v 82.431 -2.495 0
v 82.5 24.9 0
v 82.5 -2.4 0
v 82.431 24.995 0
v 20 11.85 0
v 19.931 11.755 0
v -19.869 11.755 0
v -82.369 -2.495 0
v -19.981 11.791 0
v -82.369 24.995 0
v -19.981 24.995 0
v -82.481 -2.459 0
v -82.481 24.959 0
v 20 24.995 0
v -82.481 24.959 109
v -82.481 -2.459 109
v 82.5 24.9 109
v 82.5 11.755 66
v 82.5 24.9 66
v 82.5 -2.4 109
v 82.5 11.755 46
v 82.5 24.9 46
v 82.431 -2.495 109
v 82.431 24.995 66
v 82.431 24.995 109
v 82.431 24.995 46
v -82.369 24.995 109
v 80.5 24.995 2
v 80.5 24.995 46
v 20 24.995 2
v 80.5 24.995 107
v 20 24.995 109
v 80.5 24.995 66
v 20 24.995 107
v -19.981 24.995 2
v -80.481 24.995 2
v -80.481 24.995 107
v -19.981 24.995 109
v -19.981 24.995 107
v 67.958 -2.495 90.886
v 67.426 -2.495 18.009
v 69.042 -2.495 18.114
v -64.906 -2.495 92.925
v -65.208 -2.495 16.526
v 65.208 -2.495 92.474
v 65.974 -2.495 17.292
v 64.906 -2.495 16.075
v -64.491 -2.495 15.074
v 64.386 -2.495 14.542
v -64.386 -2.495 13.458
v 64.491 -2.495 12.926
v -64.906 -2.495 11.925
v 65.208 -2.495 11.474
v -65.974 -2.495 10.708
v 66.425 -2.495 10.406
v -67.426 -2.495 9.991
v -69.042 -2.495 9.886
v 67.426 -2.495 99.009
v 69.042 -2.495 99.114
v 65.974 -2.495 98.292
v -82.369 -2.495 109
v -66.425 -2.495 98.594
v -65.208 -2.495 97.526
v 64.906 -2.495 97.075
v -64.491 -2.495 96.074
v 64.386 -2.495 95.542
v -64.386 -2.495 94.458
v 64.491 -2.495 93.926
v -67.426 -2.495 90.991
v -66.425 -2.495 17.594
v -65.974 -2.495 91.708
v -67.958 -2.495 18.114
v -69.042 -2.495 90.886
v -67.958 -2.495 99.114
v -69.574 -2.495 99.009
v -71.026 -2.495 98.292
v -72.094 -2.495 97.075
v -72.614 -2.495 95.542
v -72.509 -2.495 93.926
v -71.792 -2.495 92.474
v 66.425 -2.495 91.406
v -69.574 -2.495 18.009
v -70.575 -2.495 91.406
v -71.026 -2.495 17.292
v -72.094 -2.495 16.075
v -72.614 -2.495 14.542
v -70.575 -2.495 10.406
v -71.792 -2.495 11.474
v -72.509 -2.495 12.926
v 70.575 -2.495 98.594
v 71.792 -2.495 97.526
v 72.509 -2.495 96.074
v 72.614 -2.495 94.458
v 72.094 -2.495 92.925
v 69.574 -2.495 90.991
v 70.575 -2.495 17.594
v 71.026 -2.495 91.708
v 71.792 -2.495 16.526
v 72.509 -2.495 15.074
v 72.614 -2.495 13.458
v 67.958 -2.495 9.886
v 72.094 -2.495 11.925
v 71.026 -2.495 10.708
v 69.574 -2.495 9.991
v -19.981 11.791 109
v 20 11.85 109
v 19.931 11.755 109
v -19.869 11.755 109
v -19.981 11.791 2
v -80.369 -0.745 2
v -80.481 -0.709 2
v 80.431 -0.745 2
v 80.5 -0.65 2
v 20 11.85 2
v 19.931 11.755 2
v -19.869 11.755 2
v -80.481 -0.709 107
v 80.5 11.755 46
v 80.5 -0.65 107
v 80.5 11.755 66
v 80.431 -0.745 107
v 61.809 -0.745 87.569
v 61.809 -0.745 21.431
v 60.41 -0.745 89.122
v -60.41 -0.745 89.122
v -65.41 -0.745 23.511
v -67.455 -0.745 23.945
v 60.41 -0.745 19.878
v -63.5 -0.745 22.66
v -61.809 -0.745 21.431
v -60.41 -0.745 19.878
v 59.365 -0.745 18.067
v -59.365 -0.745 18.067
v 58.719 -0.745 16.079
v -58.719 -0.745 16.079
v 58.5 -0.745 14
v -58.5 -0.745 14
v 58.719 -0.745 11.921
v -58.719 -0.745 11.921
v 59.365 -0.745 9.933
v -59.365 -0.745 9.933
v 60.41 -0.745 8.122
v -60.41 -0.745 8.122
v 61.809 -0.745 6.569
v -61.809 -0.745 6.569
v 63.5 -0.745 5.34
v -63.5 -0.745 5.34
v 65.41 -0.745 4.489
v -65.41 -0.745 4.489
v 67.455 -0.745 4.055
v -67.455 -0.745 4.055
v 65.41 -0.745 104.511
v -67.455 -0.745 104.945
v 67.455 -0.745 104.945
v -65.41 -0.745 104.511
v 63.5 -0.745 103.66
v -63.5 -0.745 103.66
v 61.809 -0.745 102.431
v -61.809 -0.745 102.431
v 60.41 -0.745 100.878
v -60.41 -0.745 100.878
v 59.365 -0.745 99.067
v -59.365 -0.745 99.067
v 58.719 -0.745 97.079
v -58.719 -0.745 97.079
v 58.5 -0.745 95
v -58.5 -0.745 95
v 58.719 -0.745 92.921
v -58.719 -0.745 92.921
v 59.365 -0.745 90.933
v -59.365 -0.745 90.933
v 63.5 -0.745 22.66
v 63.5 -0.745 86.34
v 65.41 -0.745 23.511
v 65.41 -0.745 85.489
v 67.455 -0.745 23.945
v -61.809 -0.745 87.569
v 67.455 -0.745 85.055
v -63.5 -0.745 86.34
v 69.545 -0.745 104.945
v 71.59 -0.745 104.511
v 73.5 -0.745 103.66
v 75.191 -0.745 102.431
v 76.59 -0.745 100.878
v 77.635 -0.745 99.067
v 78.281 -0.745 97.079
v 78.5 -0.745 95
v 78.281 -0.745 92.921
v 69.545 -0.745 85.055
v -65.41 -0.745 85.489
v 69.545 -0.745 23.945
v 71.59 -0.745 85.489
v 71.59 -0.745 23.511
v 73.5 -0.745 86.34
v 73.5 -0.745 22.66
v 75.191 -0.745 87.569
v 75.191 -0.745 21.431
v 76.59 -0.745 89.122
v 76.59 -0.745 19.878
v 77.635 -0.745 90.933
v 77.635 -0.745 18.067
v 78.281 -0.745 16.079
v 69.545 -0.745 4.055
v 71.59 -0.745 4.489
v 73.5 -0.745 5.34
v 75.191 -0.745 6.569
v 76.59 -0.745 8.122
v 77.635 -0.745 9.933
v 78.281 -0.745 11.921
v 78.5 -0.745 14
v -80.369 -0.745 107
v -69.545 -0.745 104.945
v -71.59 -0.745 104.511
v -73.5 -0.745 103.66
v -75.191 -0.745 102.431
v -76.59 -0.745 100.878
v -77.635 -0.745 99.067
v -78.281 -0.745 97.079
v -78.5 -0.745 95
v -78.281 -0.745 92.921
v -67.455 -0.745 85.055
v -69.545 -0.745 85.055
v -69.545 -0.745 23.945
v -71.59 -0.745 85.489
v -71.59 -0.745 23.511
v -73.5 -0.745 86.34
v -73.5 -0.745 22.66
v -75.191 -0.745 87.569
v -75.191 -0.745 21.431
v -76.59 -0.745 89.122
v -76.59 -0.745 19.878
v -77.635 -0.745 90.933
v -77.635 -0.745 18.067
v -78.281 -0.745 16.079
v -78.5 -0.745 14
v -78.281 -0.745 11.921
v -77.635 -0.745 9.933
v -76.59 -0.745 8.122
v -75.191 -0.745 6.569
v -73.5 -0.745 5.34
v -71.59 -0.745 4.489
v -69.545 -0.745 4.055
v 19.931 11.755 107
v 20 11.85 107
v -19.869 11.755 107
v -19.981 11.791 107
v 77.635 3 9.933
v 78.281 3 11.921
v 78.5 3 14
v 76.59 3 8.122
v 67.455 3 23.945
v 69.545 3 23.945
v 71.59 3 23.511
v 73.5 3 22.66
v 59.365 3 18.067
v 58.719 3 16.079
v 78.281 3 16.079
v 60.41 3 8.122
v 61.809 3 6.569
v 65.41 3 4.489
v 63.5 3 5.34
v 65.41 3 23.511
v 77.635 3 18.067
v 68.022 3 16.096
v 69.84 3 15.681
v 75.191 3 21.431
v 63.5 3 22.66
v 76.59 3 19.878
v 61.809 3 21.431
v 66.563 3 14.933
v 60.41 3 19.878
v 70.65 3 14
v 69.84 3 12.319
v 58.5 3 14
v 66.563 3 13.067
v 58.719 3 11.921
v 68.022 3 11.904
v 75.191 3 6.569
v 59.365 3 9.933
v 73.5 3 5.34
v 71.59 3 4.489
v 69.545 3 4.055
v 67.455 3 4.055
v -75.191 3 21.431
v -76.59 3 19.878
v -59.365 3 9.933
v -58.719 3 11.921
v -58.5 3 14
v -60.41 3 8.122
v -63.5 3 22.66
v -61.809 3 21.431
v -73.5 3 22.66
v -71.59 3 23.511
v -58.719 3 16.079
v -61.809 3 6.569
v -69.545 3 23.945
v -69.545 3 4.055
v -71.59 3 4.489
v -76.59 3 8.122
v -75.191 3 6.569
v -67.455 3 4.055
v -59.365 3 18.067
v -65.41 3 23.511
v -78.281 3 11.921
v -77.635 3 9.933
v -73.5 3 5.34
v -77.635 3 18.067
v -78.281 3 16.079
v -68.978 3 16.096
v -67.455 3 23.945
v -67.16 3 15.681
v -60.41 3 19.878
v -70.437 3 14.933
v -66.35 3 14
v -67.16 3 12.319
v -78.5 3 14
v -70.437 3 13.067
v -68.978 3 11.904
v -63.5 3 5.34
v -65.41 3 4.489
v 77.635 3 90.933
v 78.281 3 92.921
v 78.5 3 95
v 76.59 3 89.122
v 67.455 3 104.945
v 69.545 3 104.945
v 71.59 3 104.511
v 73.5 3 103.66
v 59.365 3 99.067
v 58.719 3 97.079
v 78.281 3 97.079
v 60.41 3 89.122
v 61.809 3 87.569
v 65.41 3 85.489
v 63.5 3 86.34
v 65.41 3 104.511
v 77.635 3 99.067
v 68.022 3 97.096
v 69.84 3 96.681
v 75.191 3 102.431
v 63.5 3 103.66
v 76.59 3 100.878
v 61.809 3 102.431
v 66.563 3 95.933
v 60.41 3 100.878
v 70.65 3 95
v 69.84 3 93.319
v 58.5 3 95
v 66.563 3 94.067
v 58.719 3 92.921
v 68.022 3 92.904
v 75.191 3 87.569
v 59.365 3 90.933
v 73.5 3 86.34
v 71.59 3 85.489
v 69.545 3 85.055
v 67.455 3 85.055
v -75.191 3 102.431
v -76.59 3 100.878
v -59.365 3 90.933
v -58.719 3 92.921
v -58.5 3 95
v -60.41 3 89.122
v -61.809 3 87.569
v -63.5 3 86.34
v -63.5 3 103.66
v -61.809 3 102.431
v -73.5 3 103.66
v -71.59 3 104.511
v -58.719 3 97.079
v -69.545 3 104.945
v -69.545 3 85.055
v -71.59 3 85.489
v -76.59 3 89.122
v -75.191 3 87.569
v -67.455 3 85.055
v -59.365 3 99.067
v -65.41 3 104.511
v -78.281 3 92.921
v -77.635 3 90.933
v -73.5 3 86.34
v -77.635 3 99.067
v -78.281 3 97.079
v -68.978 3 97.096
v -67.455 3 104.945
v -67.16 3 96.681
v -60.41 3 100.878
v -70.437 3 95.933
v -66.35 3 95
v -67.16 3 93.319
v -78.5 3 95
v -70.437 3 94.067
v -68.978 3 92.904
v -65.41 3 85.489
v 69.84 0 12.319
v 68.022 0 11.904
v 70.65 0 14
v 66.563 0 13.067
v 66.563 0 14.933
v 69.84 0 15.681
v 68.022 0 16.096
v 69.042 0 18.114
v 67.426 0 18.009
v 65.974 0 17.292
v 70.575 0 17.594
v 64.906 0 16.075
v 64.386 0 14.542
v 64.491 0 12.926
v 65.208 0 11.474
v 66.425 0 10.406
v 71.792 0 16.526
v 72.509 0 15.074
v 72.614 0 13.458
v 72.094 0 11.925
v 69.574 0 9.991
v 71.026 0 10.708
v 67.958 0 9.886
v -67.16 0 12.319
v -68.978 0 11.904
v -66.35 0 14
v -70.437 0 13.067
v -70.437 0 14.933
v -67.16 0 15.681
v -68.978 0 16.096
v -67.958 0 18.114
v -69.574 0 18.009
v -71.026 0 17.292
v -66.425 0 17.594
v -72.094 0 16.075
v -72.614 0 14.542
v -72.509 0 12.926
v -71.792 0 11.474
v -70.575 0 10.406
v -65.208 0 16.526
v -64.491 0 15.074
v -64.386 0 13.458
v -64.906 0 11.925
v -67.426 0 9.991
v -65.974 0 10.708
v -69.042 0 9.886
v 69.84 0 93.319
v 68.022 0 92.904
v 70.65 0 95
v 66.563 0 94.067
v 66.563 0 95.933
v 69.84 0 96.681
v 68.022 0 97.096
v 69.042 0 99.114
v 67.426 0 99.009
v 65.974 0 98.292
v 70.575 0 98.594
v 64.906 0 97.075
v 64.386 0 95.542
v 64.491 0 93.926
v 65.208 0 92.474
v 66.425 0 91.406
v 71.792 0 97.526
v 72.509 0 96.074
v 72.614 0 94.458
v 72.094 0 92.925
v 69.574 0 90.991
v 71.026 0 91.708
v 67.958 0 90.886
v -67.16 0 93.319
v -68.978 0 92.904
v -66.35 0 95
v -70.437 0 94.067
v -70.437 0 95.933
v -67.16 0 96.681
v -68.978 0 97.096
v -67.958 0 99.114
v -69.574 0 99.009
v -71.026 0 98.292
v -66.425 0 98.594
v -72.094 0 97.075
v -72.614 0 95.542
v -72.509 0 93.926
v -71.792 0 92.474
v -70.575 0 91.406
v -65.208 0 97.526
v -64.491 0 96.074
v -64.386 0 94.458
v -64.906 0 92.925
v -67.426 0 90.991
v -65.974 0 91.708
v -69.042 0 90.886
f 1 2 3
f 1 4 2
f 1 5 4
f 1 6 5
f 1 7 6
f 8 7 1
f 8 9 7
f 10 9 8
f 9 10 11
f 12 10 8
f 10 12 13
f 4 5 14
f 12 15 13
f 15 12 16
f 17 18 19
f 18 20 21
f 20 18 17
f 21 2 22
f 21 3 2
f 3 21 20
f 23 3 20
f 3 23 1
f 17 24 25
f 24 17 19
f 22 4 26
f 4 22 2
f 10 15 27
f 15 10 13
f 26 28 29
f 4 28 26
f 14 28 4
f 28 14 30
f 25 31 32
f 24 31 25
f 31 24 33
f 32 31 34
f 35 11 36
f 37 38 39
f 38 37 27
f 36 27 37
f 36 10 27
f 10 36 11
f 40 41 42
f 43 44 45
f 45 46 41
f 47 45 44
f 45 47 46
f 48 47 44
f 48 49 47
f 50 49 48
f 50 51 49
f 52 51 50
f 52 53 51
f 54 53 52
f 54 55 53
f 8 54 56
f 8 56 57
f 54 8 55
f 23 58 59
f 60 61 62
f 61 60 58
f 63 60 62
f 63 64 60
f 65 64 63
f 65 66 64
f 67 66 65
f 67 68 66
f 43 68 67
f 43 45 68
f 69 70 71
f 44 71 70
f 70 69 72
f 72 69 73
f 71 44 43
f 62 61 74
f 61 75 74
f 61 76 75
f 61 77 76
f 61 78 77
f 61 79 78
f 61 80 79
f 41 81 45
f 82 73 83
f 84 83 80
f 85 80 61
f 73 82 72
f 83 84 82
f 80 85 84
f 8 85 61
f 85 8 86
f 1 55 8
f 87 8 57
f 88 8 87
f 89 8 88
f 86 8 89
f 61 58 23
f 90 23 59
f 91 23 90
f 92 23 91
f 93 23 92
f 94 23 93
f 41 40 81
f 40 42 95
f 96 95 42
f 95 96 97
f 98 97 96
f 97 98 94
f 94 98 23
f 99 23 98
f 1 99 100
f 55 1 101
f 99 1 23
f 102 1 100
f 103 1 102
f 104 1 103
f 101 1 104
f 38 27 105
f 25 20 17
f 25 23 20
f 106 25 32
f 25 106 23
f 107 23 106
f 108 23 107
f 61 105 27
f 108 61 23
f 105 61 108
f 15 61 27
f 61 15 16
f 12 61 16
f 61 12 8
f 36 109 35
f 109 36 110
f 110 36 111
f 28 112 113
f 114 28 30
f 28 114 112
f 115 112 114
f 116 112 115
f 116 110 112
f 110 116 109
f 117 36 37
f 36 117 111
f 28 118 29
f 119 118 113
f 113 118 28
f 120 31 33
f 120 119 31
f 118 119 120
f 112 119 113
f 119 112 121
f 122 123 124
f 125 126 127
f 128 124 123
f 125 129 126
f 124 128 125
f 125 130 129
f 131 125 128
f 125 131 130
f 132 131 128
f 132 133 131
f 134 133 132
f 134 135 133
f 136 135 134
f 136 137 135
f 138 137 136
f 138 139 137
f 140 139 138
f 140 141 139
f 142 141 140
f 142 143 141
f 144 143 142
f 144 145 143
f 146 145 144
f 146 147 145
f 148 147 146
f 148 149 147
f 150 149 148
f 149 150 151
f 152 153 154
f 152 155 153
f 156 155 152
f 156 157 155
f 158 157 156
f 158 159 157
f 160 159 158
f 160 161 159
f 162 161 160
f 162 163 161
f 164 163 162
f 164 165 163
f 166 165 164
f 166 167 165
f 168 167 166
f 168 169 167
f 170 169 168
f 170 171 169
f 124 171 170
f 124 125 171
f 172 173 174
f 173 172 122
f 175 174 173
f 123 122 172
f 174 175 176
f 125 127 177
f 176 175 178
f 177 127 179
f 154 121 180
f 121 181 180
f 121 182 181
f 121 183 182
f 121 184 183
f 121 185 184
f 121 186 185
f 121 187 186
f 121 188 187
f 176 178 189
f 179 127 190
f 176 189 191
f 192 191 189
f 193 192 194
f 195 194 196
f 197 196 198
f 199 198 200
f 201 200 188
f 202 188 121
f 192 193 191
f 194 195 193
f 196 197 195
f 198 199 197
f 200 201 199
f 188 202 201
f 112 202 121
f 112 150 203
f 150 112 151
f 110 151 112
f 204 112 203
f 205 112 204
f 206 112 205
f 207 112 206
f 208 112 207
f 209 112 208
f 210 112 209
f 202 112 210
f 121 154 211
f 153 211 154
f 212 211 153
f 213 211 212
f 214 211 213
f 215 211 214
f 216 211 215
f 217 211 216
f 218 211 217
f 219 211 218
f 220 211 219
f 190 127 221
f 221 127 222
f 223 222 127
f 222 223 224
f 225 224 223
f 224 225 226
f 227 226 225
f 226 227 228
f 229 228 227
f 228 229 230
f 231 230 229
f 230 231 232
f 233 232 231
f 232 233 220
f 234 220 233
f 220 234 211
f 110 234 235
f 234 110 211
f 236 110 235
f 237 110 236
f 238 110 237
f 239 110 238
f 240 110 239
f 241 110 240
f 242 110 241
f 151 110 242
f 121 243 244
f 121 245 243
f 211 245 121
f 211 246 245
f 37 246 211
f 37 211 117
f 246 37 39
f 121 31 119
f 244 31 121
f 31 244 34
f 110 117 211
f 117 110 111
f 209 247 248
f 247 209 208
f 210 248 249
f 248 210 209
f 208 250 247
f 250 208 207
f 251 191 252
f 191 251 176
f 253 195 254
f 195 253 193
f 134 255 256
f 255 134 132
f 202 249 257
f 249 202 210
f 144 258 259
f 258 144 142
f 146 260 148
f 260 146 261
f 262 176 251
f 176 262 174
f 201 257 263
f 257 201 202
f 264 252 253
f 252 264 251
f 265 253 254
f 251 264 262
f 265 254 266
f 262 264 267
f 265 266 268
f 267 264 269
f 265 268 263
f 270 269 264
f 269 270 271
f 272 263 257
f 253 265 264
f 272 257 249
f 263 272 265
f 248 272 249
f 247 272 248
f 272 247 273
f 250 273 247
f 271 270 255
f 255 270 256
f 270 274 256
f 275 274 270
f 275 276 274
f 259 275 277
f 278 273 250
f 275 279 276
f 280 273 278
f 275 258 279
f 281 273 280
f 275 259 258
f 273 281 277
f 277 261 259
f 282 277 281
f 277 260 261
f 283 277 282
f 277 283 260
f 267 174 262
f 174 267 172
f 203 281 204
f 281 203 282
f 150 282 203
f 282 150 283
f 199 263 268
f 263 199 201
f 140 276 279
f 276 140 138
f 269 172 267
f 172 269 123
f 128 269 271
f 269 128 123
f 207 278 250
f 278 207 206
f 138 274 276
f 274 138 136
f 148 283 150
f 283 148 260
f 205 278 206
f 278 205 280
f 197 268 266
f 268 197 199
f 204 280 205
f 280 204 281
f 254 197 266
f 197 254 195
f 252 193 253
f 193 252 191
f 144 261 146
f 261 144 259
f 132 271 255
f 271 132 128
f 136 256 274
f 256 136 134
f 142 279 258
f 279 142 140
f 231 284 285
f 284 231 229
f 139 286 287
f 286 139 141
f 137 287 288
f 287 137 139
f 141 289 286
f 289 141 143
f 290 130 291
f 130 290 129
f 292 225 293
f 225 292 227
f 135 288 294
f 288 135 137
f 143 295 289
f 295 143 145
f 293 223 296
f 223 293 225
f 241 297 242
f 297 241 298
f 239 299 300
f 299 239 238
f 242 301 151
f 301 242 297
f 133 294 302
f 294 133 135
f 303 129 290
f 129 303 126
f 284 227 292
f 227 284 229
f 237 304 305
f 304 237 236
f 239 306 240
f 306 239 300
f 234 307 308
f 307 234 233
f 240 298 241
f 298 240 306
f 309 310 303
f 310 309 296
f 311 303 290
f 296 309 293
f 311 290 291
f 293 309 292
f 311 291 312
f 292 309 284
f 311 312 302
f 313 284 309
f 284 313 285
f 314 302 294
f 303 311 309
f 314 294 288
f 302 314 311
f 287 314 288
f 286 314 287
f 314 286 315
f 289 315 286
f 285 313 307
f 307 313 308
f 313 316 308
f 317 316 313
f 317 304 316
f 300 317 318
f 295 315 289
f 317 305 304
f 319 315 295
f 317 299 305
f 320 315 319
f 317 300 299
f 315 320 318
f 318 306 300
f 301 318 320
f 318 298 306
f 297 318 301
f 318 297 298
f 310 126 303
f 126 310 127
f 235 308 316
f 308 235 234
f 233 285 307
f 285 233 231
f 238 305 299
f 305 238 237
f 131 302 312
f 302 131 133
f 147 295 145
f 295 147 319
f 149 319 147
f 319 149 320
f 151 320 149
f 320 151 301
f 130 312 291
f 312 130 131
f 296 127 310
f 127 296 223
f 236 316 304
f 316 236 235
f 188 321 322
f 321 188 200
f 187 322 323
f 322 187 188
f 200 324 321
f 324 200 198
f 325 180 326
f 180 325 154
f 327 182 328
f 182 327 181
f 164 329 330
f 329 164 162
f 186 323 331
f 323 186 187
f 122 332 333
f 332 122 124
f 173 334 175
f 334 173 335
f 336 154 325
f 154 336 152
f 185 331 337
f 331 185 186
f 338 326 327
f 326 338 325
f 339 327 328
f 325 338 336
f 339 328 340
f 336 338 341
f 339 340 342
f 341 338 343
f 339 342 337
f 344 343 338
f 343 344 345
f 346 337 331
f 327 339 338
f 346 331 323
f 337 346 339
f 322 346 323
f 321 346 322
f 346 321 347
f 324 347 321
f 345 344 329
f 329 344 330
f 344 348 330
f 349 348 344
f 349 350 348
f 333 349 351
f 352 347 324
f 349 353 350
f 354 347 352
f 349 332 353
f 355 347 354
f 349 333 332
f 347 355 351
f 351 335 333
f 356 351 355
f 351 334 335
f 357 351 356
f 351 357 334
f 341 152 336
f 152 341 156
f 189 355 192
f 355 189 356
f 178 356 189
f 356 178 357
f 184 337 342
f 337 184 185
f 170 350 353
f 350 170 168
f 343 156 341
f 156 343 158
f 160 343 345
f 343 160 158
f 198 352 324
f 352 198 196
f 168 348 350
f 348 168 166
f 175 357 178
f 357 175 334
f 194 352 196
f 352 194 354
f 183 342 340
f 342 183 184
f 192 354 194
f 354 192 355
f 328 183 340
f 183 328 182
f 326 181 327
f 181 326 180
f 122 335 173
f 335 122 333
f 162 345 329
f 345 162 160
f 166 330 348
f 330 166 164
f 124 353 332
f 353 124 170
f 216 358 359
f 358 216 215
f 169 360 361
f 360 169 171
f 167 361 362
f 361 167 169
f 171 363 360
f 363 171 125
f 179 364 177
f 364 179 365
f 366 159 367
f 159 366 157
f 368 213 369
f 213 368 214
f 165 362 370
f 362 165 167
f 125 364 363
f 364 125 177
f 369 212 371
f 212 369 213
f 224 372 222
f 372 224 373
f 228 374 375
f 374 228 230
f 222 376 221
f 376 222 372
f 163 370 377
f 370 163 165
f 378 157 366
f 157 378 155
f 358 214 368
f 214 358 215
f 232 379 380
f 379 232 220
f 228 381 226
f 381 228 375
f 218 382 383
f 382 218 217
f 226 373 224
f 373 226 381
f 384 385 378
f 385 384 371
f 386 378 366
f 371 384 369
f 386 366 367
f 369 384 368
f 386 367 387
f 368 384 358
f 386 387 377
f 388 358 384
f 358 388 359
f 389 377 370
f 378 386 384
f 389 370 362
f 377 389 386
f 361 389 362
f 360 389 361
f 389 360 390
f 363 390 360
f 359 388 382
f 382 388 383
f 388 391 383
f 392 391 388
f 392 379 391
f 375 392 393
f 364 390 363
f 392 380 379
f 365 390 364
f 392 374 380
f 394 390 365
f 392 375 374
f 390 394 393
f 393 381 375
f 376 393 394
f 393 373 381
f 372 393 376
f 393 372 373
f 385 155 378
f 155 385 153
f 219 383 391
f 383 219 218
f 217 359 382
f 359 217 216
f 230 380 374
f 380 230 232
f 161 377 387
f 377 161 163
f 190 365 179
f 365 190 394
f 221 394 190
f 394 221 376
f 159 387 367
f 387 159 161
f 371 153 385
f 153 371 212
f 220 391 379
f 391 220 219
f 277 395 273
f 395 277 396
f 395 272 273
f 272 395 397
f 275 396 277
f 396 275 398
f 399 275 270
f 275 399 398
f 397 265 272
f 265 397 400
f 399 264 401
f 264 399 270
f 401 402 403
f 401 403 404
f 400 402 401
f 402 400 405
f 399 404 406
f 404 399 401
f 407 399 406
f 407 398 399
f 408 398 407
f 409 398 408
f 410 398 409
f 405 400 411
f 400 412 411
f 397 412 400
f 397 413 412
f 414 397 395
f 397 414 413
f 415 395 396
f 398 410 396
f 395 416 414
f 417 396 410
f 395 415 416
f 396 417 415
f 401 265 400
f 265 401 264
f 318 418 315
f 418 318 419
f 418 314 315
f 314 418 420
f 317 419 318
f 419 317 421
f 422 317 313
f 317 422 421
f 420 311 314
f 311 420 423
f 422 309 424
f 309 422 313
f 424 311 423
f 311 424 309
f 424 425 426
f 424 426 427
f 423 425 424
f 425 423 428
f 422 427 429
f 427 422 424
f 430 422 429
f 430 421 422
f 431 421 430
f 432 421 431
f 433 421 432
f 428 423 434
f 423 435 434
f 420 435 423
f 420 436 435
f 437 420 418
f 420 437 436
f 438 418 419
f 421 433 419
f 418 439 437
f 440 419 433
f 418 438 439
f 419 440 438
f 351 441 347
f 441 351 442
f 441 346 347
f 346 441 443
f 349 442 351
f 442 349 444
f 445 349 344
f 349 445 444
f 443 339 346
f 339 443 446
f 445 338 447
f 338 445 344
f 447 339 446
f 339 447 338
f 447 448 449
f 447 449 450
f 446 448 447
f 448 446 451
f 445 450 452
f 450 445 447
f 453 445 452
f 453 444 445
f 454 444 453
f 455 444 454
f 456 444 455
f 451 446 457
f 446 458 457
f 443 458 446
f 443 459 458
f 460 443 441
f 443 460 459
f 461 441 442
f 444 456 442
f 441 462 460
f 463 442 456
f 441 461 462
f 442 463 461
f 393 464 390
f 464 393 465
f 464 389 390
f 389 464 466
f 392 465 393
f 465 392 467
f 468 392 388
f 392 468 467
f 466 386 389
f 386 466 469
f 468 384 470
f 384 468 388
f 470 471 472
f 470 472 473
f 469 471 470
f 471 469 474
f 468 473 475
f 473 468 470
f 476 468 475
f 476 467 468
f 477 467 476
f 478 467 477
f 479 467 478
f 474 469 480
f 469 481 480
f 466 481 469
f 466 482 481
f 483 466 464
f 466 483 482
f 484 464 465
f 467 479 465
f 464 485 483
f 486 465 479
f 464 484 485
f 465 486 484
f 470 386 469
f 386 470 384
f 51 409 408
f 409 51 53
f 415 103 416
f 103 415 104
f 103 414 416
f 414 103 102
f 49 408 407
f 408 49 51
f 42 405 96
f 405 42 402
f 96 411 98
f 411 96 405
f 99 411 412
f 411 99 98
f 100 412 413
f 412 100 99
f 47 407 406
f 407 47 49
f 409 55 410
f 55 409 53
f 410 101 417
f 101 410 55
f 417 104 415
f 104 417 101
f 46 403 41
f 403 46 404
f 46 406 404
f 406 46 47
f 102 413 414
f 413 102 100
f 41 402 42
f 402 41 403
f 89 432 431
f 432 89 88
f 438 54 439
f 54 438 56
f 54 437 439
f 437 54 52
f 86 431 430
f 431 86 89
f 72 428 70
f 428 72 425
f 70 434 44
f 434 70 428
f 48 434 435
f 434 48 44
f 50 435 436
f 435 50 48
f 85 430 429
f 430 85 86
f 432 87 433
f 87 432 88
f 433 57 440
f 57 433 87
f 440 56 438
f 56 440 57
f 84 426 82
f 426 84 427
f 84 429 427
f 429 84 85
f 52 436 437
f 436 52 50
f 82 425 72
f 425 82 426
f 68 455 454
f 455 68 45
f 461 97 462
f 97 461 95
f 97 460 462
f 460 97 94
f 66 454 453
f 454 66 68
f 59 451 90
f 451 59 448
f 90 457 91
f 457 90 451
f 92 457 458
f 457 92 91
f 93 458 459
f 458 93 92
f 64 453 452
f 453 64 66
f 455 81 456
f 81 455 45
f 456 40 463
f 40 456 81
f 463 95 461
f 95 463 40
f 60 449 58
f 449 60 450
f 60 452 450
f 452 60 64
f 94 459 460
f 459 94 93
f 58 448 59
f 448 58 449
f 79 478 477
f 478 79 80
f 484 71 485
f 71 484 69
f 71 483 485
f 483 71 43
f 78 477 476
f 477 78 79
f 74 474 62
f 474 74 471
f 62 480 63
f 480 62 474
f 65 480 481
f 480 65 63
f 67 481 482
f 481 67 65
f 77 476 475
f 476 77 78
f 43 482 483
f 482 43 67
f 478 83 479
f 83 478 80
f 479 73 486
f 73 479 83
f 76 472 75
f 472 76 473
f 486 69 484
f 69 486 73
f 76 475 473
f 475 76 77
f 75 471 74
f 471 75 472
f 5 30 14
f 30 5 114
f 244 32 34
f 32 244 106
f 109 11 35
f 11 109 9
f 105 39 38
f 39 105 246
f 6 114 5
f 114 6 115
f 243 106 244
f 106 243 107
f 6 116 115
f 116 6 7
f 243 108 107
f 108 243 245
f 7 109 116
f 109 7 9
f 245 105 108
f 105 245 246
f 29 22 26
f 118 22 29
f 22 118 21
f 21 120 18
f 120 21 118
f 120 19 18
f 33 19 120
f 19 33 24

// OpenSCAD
// file: parameter.scad
//-------Parameter GHarp----------------------------------------------------

strScale=650;
strDia=3;
strPosX=20;
strPosY=-20;
slotXY=20;
nStr=3;

nema17_height=40;
nema17_width=42;
nema17_shftDia=5;
nema17_shftLen=28;
nema17_holeDist=31;
Nema17_gearDia=23;

tuner_bDi=7.8;
tuner_bDo=22.2;
tuner_bZ=10;
tuner_rThick=5;
//tuner_tDia=strPosX*2; (big)
tuner_tDia=strPosX*2-10;
tuner_leverZ=10;
tuner_zPos=225;
tuner_strDia=strDia[0];
tuner_leverY=35;

//----------Kickup----------------------------------------------------

kickup_baseX=17;
kickup_baseY=13;
kickup_zAdjDia=3.3;
kickup_zAdjL=10;
kickup_zAdjDist=10.5;
kickup_zAdjOff=4;
//------------------------------------------------------------------------

slide_cpDst=1.5;
slide_rackPosX=(55-12.5);

m3Dia=3.3;
m3NutD=6.6;
m4Dia=4.3;
m4NutD=8.3;
m4NutZ=5;
m5Dia=5.3;
m5HeadD=9.6;

edgeR=3;

gearXPos=57;
gearYPos=0;
gearZPos=360;

rackScrD=20;
rack_X=13;
rack_Y=15.5;
rack_extOffX=0;

bearGearD=25;
mntGrD=20.5; //mount gear distance

mnt_pcbA_X=157;
mnt_pcbA_Y=101;

//---------End Parameter GHarp-----------------------------------------------


////-------Parameter Bass----------------------------------------------------

//strScale=650;
//strDia=4;
//strPosX=20;
//strPosY=-20;
//slotXY=20;
//
//nema17_height=40;
//nema17_width=42;
//nema17_shftDia=5;
//nema17_shftLen=28;
//nema17_holeDist=31;
//Nema17_gearDia=23;
//
//tuner_bDi=7.8;
//tuner_bDo=22.2;
//tuner_bZ=10;
//tuner_rThick=5;
////tuner_tDia=strPosX*2; (big)
//tuner_tDia=strPosX*2-10;
//tuner_leverZ=10;
//tuner_zPos=225;
//tuner_strDia=strDia[0];
//tuner_leverY=35;
//
////----------Kickup----------------------------------------------------
//
//
//kickup_baseX=22;
//kickup_baseY=15;
//kickup_zAdjDia=3.3;
//kickup_zAdjL=10;
//kickup_zAdjDist=13;
//kickup_zAdjOff=4;
//
//
//slide_cpDst=1.5;
//slide_rackPosX=(55-12.5);
//
//m3NutD=6.6;
//m4Dia=4.3;
//m4NutD=8.3;
//m5Dia=5.3;
//
//edgeR=3;
//
//gearXPos=57;
//gearYPos=0;
//gearZPos=360;
//
//rackScrD=20;
//rack_X=13;
//rack_Y=15.5;
//rack_extOffX=0;
//
//bearGearD=25;
//mntGrD=20.5; //mount gear distance
////
//////---------End Bass-----------------------------------------------
// file: libs/rcube.scad
module rcube(size,radius){
linear_extrude(height=size[2])
if(radius>0){
hull()
{
    // place 4 circles in the corners, with the given radius
    translate([(-size[0]/2)+(radius), (-size[1]/2)+(radius), 0])
    circle(r=radius);

    translate([(size[0]/2)-(radius), (-size[1]/2)+(radius), 0])
    circle(r=radius);

    translate([(-size[0]/2)+(radius), (size[1]/2)-(radius), 0])
    circle(r=radius);

    translate([(size[0]/2)-(radius), (size[1]/2)-(radius), 0])
    circle(r=radius);
}
}
if(radius==0){
translate([0,0,size[2]/2])cube(size,center=true);
}
}
// main file
include <libs/rcube.scad>;
include <parameter.scad>;

pcbX=mnt_pcbA_X;
pcbY=8;
pcbZ=mnt_pcbA_Y;
pcbZu=4;

wtPcb=4;
wtSlot=4;

z=pcbZ+wtPcb*2;
x=pcbX+wtSlot*2;

btmTh=2;

//base();
lid();

module base(){

difference(){
union(){
difference(){
translate([0,pcbY/2-wtSlot/2,0])rcube([x,pcbY+wtSlot,z],0.1);
translate([0,pcbY/2+wtSlot/2,wtPcb])rcube([pcbX,pcbY+wtSlot,pcbZ],0.1);
}

translate([pcbX/2-slotXY/2,-1,wtPcb+slotXY/2])rotate([-90,0,0])cylinder(d=slotXY,h=pcbZu+1);
translate([-(pcbX/2-slotXY/2),-1,wtPcb+slotXY/2])rotate([-90,0,0])cylinder(d=slotXY,h=pcbZu+1);
translate([pcbX/2-slotXY/2,-1,wtPcb-slotXY/2+pcbZ])rotate([-90,0,0])cylinder(d=slotXY,h=pcbZu+1);
translate([-(pcbX/2-slotXY/2),-1,wtPcb-slotXY/2+pcbZ])rotate([-90,0,0])cylinder(d=slotXY,h=pcbZu+1);
}

translate([pcbX/2-slotXY/2,0,wtPcb+slotXY/2])rotate([-90,0,0])cylinder(d=m4Dia,h=pcbZu+btmTh);
translate([-(pcbX/2-slotXY/2),0,wtPcb+slotXY/2])rotate([-90,0,0])cylinder(d=m4Dia,h=pcbZu+btmTh);
translate([pcbX/2-slotXY/2,0,wtPcb-slotXY/2+pcbZ])rotate([-90,0,0])cylinder(d=m4Dia,h=pcbZu+btmTh);
translate([-(pcbX/2-slotXY/2),0,wtPcb-slotXY/2+pcbZ])rotate([-90,0,0])cylinder(d=m4Dia,h=pcbZu+btmTh);

translate([pcbX/2-slotXY/2,-wtSlot,wtPcb+slotXY/2])rotate([-90,30,0])cylinder(d=m4NutD,h=wtSlot,$fn=6);
translate([-(pcbX/2-slotXY/2),-wtSlot,wtPcb+slotXY/2])rotate([-90,30,0])cylinder(d=m4NutD,h=wtSlot,$fn=6);
translate([pcbX/2-slotXY/2,-wtSlot,wtPcb-slotXY/2+pcbZ])rotate([-90,30,0])cylinder(d=m4NutD,h=wtSlot,$fn=6);
translate([-(pcbX/2-slotXY/2),-wtSlot,wtPcb-slotXY/2+pcbZ])rotate([-90,30,0])cylinder(d=m4NutD,h=wtSlot,$fn=6);
}

for (i = [0 : nStr-1]) {
translate([-x/2+slotXY/2+wtSlot+i*x/2-i*(slotXY+wtSlot*2)/2,0,0])difference(){
    
translate([0,-(slotXY+wtSlot)/2,0])rcube([slotXY+wtSlot*2,slotXY+wtSlot,z],1);

translate([0,-(slotXY+wtSlot*2)/2,-1])rcube([slotXY,slotXY+wtSlot*2,pcbZ+wtSlot*2+2],0.01);

translate([0,-(slotXY+wtSlot*2)/2,z*5/6])rotate([0,90,0])cylinder(d=m5Dia,h=slotXY*2,center=true);
translate([0,-(slotXY+wtSlot*2)/2,z*1/6])rotate([0,90,0])cylinder(d=m5Dia,h=slotXY*2,center=true);
    
//translate([slotXY/2+wthick,-(slotXY+wthick*2)/2,z*1/6])rotate([0,90,0])cylinder(d=m5HeadD,h=slotXY);
//translate([-(slotXY/2+wthick),-(slotXY+wthick*2)/2,z*1/6])rotate([0,-90,0])cylinder(d=m5HeadD,h=slotXY);
//    
//translate([slotXY/2+wthick,-(slotXY+wthick*2)/2,z*5/6])rotate([0,90,0])cylinder(d=m5HeadD,h=slotXY);
//translate([-(slotXY/2+wthick),-(slotXY+wthick*2)/2,z*5/6])rotate([0,-90,0])cylinder(d=m5HeadD,h=slotXY);
}
}
}

module lid(){
    pcbY=25;
    topTh=2.5;
    screwSockZ=4;
    sizeExtra=4;
    
difference(){
union(){
    difference(){
    translate([0,pcbY/2-topTh/2,0])rcube([x,pcbY+topTh,z],0.1);
    translate([0,pcbY/2+topTh/2,wtPcb-sizeExtra/2])rcube([pcbX+sizeExtra,pcbY+wtSlot,pcbZ+sizeExtra],0.1);
    }

    translate([pcbX/2-slotXY/2,-1,wtPcb+slotXY/2])rotate([-90,0,0])cylinder(d=slotXY,h=screwSockZ);
    translate([-(pcbX/2-slotXY/2),-1,wtPcb+slotXY/2])rotate([-90,0,0])cylinder(d=slotXY,h=screwSockZ);
    translate([pcbX/2-slotXY/2,-1,wtPcb-slotXY/2+pcbZ])rotate([-90,0,0])cylinder(d=slotXY,h=screwSockZ);
    translate([-(pcbX/2-slotXY/2),-1,wtPcb-slotXY/2+pcbZ])rotate([-90,0,0])cylinder(d=slotXY,h=screwSockZ);
    }

translate([pcbX/2-slotXY/2,0,wtPcb+slotXY/2])rotate([-90,0,0])cylinder(d=m4Dia,h=pcbZu+btmTh);
translate([-(pcbX/2-slotXY/2),0,wtPcb+slotXY/2])rotate([-90,0,0])cylinder(d=m4Dia,h=pcbZu+btmTh);
translate([pcbX/2-slotXY/2,0,wtPcb-slotXY/2+pcbZ])rotate([-90,0,0])cylinder(d=m4Dia,h=pcbZu+btmTh);
translate([-(pcbX/2-slotXY/2),0,wtPcb-slotXY/2+pcbZ])rotate([-90,0,0])cylinder(d=m4Dia,h=pcbZu+btmTh);

translate([pcbX/2-slotXY/2,-wtSlot,wtPcb+slotXY/2])rotate([-90,30,0])cylinder(d=m4NutD,h=wtSlot,$fn=16);
translate([-(pcbX/2-slotXY/2),-wtSlot,wtPcb+slotXY/2])rotate([-90,30,0])cylinder(d=m4NutD,h=wtSlot,$fn=16);
translate([pcbX/2-slotXY/2,-wtSlot,wtPcb-slotXY/2+pcbZ])rotate([-90,30,0])cylinder(d=m4NutD,h=wtSlot,$fn=16);
translate([-(pcbX/2-slotXY/2),-wtSlot,wtPcb-slotXY/2+pcbZ])rotate([-90,30,0])cylinder(d=m4NutD,h=wtSlot,$fn=16);
    
    translate([0,pcbY+topTh/2,-1])rcube([40,pcbY+wtSlot,pcbZ*2],0.1);
        translate([pcbX/2,pcbY+topTh/2,56-10])rcube([pcbX,pcbY+wtSlot,20],0.1);
}
}
